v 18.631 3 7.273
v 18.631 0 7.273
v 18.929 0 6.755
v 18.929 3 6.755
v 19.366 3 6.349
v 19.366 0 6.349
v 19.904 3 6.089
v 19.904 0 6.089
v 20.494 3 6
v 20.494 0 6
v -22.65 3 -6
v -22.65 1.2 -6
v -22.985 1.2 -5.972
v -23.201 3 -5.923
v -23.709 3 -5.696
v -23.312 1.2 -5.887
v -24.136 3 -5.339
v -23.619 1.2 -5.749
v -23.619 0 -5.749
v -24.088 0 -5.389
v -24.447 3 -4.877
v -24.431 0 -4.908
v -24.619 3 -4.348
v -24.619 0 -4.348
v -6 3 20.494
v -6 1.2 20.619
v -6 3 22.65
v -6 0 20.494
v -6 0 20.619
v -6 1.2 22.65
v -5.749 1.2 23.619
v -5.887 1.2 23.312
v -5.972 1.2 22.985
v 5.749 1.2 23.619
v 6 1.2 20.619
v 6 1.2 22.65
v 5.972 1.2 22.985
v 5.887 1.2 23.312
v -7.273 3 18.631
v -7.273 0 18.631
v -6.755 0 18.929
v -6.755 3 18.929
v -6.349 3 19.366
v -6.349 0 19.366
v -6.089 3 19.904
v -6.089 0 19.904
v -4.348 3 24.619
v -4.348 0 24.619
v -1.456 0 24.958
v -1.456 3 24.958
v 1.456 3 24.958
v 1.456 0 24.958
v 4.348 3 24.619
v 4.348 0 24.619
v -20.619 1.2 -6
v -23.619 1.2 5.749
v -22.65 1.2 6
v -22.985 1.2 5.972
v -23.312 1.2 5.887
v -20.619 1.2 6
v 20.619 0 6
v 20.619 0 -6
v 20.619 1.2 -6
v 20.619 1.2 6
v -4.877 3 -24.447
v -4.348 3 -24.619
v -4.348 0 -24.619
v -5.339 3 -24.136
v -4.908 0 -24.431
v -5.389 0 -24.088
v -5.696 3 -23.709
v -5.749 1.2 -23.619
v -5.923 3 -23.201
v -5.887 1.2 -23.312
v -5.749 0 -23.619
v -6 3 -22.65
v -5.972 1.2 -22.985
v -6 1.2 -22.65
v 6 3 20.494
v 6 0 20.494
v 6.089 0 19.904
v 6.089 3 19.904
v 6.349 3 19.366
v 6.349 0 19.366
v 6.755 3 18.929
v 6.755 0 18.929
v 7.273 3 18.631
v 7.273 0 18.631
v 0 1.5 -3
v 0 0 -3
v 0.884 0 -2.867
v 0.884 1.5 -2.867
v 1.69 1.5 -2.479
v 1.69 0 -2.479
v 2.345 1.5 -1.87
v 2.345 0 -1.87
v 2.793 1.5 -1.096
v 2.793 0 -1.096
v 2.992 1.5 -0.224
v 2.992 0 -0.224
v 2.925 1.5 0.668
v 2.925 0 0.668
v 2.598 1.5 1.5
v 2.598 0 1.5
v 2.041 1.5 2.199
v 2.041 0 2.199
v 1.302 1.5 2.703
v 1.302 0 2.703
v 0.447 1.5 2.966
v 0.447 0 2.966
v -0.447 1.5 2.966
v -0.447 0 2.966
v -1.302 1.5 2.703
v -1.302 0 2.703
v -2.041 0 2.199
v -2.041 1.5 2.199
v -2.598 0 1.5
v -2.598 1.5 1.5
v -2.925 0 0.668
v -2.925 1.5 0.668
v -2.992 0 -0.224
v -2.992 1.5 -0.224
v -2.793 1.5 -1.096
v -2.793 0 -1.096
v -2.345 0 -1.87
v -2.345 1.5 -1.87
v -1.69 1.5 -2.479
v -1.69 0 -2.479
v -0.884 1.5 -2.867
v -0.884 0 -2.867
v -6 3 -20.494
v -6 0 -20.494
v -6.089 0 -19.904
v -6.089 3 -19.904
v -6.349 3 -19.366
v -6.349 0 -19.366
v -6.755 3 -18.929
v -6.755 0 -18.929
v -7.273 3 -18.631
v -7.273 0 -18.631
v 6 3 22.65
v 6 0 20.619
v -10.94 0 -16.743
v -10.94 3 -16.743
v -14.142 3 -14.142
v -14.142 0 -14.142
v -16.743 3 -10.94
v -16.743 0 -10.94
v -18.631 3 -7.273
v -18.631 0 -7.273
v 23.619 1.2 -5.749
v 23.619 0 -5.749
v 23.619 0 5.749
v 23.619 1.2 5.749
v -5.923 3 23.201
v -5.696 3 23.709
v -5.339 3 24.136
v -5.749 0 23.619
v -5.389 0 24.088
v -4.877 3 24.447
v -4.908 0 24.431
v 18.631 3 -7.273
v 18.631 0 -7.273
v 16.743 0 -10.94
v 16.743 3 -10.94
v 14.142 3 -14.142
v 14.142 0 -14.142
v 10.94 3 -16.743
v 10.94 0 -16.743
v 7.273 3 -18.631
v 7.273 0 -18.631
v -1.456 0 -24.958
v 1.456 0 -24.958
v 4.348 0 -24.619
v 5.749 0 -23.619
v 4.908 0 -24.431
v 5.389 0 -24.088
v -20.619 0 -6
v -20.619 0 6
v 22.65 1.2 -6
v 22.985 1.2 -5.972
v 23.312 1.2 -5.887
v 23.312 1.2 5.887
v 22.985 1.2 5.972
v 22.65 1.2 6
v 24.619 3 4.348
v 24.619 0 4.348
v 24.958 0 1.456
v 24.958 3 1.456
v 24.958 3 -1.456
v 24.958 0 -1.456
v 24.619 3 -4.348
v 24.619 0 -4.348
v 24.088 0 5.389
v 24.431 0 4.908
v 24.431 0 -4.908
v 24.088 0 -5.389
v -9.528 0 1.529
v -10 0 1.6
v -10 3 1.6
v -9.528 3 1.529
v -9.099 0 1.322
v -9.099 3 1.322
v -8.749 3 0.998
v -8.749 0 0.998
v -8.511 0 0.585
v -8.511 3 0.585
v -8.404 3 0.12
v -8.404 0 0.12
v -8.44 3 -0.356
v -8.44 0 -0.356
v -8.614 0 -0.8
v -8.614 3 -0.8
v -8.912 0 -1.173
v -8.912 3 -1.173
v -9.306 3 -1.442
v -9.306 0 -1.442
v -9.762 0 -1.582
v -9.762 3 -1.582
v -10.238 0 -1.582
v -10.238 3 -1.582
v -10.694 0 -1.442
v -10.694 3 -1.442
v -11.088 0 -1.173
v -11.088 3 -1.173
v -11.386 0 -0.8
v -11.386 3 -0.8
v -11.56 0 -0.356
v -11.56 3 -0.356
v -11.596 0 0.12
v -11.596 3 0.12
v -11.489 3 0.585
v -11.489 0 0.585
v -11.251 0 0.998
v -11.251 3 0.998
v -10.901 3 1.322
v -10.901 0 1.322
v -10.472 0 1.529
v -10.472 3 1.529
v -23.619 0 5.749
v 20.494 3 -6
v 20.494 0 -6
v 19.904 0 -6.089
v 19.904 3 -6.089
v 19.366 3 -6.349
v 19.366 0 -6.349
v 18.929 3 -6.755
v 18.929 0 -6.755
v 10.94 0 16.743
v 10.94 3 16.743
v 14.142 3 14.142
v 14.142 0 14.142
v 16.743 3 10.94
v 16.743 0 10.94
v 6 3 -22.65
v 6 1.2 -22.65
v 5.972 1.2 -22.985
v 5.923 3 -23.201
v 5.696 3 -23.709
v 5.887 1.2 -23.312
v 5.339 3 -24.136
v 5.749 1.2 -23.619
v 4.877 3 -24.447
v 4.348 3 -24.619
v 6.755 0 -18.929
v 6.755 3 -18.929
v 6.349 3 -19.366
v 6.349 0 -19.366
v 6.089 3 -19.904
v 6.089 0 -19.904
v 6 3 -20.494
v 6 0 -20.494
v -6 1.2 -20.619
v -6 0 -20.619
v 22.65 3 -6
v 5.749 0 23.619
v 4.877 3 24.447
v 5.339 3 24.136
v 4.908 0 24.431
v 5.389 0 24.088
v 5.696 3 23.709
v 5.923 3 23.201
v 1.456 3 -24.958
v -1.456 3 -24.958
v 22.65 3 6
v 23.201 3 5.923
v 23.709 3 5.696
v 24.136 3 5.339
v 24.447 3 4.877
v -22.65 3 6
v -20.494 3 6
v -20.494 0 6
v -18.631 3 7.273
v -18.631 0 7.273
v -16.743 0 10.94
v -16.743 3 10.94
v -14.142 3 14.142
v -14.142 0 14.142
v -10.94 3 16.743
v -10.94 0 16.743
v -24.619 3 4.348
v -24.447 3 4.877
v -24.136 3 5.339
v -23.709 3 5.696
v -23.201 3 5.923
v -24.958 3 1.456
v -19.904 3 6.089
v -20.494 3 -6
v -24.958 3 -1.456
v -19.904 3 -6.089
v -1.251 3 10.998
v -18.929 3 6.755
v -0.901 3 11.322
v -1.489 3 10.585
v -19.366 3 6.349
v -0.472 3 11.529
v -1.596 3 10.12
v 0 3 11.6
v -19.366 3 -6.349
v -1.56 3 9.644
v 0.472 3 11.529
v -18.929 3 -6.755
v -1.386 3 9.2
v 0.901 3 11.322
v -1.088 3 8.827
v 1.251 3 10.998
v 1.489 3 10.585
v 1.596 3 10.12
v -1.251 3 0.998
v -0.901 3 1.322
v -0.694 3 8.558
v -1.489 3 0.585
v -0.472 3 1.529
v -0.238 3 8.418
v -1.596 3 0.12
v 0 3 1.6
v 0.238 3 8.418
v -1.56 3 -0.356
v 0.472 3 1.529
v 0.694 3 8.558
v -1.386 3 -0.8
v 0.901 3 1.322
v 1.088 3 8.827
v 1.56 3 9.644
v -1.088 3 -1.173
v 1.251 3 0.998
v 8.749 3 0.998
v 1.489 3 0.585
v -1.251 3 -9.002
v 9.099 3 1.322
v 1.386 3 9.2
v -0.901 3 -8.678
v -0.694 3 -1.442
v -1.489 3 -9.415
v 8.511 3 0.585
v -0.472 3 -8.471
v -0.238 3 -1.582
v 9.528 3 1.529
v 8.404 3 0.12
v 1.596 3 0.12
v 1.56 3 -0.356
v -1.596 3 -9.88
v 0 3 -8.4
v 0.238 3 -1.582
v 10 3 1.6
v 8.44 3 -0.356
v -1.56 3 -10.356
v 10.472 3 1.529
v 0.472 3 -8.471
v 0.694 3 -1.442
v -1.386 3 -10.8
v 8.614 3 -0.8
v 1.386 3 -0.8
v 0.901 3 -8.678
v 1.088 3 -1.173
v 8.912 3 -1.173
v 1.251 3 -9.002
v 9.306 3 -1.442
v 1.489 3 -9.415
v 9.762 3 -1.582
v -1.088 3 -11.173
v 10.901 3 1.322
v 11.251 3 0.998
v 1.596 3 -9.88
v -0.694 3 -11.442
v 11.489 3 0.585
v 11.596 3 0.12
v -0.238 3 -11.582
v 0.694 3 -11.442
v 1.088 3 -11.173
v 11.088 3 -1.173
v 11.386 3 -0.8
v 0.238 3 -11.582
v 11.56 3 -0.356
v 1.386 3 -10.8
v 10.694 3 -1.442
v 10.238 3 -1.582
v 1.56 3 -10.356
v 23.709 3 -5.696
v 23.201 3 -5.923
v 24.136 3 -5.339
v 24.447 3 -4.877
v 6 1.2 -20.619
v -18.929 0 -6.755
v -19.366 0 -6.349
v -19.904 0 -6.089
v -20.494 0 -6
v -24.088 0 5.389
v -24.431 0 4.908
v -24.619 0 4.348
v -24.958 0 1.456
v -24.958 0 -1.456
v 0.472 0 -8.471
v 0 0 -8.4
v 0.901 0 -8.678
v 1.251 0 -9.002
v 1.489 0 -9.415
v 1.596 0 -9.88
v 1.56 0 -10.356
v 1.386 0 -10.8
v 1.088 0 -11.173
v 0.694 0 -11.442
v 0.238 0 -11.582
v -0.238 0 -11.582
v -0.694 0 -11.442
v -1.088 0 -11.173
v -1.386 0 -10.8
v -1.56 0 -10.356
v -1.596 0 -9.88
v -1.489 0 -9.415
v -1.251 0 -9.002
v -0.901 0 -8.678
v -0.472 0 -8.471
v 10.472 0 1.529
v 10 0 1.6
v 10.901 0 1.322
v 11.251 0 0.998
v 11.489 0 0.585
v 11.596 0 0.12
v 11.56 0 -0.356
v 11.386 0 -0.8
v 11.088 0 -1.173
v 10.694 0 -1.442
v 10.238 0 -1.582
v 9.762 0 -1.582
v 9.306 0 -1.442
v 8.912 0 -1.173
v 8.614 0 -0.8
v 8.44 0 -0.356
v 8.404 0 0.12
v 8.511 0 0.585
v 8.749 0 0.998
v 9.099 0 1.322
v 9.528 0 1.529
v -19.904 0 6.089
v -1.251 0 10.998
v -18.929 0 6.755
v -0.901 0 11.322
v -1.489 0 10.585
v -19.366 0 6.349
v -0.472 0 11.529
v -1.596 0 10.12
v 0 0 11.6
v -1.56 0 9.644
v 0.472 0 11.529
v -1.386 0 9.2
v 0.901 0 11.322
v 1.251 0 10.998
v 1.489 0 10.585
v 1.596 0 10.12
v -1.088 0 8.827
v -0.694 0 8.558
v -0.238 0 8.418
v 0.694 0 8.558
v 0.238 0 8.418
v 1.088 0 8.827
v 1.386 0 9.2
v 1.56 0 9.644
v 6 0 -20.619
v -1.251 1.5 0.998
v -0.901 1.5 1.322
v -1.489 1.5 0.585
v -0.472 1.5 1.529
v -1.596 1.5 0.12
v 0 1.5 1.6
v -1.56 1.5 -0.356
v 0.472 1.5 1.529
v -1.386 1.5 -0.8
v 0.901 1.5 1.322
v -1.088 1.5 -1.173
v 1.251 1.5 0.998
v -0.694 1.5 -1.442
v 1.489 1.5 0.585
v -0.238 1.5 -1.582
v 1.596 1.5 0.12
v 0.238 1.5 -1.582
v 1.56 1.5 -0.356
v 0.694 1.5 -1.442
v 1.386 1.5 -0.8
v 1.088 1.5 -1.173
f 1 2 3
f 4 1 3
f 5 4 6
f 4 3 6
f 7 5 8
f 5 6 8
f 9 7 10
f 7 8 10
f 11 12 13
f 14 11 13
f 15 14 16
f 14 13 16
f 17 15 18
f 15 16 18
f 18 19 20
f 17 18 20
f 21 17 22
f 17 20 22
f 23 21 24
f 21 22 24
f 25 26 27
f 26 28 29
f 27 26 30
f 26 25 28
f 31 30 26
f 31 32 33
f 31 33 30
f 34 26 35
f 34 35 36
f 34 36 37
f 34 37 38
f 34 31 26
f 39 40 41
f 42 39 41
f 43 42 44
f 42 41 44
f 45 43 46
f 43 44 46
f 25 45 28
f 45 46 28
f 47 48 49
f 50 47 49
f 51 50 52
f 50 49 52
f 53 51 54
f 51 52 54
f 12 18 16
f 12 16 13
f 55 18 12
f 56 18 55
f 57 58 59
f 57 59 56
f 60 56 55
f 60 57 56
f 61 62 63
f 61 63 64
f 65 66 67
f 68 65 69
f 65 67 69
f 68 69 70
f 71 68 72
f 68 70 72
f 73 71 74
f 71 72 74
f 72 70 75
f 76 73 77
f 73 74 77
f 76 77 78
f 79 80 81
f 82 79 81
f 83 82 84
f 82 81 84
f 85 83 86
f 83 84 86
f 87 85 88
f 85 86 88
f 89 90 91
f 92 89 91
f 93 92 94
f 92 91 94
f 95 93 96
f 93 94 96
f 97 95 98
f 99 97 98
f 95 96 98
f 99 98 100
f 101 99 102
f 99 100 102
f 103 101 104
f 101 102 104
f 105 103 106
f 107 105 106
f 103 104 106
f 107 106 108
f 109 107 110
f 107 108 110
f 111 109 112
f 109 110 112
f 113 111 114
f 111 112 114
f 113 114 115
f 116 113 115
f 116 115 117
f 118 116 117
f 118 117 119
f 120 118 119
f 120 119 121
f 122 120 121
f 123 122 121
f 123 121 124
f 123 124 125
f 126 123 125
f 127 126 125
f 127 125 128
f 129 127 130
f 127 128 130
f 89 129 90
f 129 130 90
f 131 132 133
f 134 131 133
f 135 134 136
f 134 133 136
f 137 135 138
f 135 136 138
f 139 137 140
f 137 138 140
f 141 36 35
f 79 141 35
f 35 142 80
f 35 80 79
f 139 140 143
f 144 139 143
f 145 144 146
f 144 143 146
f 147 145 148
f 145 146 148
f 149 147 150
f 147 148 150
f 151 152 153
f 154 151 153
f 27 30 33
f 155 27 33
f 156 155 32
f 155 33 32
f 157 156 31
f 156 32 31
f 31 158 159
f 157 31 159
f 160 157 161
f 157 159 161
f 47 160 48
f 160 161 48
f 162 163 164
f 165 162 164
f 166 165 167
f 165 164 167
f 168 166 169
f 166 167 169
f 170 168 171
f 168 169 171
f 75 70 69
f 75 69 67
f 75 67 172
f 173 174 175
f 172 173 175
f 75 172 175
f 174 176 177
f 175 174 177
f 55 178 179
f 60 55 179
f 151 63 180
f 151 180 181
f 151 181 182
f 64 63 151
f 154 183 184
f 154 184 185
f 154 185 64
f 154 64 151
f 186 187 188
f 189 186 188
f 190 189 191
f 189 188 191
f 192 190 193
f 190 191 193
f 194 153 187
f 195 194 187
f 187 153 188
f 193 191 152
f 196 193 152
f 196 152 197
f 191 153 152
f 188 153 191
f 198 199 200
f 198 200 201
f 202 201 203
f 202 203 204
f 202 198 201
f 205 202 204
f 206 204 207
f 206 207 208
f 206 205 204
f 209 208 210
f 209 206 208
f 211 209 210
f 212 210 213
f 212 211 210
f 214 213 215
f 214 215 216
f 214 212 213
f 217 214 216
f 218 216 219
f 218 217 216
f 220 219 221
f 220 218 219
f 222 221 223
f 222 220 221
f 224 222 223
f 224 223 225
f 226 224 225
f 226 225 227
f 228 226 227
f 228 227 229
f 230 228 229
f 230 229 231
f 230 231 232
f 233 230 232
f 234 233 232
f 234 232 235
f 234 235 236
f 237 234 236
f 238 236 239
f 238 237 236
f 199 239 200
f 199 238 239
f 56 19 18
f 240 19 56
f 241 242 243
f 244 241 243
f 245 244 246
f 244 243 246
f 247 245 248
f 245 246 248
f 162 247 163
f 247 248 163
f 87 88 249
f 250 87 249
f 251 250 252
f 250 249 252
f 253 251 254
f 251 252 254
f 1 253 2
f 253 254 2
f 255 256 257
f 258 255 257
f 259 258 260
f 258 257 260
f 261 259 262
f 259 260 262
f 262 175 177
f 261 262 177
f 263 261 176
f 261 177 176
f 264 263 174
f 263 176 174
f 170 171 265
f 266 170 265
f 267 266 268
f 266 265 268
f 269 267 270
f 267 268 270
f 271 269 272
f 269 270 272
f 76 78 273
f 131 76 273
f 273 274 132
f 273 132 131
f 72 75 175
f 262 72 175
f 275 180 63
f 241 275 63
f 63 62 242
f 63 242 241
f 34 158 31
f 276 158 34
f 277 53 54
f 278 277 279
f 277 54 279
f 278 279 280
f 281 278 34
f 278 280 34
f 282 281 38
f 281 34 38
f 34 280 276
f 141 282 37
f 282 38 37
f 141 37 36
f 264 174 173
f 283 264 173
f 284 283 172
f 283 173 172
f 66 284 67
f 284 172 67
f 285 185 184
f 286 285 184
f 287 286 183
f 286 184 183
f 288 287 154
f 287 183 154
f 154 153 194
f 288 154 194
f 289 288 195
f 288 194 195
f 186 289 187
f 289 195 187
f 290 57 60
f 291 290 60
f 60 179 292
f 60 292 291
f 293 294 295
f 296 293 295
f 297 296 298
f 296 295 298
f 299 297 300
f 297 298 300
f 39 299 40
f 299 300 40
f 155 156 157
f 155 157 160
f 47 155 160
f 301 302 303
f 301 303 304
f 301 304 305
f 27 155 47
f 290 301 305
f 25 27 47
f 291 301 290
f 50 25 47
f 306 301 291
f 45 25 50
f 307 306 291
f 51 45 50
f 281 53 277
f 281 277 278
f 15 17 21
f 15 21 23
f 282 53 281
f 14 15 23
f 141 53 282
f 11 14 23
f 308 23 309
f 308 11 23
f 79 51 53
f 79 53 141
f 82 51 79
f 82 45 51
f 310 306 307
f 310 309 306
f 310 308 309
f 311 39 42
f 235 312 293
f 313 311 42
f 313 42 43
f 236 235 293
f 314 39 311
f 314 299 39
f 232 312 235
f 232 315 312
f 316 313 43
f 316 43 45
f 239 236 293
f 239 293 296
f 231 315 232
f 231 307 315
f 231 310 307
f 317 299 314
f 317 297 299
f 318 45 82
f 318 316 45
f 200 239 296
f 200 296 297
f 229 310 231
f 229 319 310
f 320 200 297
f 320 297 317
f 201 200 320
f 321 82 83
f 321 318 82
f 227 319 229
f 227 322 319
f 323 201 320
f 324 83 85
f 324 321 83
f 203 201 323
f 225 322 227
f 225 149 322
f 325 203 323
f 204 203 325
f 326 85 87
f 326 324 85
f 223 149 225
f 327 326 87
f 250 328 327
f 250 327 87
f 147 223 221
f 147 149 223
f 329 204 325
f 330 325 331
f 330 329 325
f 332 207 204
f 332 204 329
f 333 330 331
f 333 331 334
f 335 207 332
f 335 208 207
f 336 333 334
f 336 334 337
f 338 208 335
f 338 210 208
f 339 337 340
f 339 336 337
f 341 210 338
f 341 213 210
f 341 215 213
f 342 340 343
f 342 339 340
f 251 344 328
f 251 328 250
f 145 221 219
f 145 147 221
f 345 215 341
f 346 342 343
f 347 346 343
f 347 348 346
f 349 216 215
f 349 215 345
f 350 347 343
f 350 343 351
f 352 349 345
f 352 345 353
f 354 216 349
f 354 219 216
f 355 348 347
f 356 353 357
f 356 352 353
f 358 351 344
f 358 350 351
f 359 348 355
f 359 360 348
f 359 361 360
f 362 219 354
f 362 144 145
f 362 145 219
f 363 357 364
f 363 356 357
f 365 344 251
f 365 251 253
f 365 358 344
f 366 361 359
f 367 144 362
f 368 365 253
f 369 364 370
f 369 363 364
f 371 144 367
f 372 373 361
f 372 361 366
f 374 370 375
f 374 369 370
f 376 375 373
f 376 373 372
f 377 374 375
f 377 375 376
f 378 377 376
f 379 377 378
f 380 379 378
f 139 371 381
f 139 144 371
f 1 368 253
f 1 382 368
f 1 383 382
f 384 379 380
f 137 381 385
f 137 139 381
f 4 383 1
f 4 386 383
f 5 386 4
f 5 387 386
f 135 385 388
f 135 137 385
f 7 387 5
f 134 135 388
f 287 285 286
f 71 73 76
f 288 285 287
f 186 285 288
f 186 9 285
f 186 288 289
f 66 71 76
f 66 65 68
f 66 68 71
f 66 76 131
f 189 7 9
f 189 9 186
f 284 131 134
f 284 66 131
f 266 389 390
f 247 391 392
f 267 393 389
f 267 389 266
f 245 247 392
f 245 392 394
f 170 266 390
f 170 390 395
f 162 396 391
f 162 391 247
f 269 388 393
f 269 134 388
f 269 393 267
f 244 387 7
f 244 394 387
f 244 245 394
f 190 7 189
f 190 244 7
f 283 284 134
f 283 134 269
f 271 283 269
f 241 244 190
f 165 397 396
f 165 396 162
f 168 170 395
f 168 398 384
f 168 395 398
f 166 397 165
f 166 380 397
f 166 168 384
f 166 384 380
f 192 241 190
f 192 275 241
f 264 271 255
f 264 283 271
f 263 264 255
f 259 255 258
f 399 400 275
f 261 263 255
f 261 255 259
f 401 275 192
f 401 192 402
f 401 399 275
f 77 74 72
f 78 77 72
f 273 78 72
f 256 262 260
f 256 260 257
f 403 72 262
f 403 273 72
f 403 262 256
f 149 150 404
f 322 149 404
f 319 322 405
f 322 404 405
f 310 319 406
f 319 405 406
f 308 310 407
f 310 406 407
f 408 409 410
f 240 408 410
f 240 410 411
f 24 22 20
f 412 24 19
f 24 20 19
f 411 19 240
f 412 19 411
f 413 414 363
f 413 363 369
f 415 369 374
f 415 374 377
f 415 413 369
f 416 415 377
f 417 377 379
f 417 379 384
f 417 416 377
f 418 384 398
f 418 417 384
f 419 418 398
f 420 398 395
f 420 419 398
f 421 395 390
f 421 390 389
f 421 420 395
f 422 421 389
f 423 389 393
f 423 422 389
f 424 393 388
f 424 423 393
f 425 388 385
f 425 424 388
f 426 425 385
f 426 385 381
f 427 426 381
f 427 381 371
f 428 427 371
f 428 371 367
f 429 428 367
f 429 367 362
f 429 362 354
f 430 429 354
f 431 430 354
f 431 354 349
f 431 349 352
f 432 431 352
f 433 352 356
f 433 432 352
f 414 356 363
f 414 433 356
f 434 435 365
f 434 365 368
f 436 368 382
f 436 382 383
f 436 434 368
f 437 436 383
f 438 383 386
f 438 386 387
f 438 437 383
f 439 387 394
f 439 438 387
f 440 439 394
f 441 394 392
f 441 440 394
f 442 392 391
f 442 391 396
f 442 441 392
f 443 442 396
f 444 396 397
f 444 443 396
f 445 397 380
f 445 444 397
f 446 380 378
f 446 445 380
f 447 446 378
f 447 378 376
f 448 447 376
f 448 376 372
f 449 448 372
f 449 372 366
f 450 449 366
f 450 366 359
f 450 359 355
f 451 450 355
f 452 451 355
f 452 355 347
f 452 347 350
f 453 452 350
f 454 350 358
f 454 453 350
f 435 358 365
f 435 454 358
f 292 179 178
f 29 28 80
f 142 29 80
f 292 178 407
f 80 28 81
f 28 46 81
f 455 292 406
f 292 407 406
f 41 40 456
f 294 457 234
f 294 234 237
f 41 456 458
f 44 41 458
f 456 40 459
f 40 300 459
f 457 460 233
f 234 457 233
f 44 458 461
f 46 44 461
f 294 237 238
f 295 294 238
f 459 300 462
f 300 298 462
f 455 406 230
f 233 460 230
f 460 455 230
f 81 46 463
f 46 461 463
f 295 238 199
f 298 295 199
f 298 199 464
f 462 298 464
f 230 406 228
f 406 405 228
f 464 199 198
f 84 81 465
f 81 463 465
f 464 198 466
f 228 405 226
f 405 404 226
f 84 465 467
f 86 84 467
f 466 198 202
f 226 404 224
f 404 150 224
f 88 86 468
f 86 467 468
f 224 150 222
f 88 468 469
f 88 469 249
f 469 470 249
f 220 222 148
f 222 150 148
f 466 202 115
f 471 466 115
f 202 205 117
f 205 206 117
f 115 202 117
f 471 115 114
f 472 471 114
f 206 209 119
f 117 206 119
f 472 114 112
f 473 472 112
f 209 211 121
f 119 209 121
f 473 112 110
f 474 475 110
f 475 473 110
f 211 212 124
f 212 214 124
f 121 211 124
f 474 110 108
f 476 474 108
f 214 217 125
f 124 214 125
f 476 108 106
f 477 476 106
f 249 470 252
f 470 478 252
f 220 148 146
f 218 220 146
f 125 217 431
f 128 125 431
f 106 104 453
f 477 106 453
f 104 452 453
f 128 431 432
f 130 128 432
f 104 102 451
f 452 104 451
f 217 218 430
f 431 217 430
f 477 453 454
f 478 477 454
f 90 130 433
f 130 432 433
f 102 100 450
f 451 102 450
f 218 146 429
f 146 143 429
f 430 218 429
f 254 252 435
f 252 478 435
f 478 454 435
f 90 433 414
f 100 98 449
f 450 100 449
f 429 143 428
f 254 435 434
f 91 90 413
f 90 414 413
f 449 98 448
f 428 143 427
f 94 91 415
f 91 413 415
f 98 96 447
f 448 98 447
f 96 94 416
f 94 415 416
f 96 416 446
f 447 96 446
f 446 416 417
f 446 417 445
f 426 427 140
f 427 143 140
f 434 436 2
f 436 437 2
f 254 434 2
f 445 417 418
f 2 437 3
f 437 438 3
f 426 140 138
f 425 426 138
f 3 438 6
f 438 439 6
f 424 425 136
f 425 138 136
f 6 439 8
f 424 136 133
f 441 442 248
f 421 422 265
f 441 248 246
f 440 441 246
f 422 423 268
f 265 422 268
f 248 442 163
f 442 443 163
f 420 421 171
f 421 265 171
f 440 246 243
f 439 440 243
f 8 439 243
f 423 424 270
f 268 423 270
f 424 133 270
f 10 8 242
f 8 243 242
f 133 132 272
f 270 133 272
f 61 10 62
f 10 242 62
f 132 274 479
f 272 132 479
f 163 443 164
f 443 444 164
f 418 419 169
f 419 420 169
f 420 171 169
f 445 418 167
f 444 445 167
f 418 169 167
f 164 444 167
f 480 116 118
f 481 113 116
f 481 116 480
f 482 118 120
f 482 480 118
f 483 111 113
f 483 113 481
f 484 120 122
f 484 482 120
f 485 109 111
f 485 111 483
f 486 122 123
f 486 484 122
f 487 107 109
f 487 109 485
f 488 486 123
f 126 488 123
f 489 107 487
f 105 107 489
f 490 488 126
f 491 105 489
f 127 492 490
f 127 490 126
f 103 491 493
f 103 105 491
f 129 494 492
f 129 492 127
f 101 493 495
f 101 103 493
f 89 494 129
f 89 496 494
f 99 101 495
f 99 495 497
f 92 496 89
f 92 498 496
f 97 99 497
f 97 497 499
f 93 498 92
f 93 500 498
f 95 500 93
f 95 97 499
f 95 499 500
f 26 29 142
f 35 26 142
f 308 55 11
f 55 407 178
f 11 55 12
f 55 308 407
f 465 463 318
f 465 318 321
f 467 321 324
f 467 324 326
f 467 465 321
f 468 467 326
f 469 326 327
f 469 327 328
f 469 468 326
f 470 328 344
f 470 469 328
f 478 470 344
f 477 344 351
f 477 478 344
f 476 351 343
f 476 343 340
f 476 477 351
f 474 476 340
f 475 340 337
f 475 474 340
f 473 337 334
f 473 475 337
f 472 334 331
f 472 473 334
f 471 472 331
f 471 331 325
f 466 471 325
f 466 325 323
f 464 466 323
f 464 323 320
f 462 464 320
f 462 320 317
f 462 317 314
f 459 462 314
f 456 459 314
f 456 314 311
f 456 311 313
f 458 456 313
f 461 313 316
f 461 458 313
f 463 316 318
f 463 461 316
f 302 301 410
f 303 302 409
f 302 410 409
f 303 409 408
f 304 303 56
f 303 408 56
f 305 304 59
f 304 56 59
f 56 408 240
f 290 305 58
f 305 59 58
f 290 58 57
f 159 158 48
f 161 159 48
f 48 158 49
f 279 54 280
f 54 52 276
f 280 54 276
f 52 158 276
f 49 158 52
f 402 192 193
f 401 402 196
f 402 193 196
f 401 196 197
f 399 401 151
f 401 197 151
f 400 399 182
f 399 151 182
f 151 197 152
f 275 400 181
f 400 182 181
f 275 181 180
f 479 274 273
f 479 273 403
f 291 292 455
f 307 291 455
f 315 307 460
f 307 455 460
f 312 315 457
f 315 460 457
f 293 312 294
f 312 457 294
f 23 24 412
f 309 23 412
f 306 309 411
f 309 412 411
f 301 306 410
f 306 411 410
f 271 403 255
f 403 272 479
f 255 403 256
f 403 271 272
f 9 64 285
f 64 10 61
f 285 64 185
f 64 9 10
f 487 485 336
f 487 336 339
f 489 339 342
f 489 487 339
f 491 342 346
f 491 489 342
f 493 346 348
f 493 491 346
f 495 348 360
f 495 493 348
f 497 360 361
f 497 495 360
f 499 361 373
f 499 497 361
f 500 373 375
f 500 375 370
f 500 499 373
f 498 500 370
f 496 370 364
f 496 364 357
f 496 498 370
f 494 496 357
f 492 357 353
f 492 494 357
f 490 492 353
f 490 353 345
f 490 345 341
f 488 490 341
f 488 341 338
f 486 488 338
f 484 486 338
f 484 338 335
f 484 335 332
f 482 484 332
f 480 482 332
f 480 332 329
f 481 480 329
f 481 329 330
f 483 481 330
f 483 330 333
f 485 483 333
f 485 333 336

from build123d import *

# Parameters (mm, degrees)
SKIZZE1_R                       = 19
SKIZZE1_R_2                     = 1.6
AUFSATZ_LINEAR_AUSTRAGEN1_DEPTH = 3
SKIZZE6_R                       = 3
SCHNITT_LINEAR_AUSTRAGEN2_DEPTH = 1.5
SKIZZE7_W                       = 3
SKIZZE7_H                       = 12
SKIZZE7_W_2                     = 12
SKIZZE7_H_2                     = 3
SCHNITT_LINEAR_AUSTRAGEN3_DEPTH = 1.2


with BuildPart() as part:
    # Skizze1 → Aufsatz-Linear austragen1 (new body)
    with BuildSketch(Plane(origin=(0, 0, 0), x_dir=(1, 0, 0), z_dir=(0, 1, 0))):
        with BuildLine():
            ThreePointArc((6, -20.493901532), (6.348554352, -19.365749382), (7.272727273, -18.630819574))
            ThreePointArc((7.272727273, -18.630819574), (14.142135624, -14.142135624), (18.630819574, -7.272727273))
            ThreePointArc((18.630819574, -7.272727273), (19.365749382, -6.348554352), (20.493901532, -6))
            Line((20.493901532, -6), (22.649503306, -6))
            ThreePointArc((22.649503306, -6), (23.93487248, -5.532261755), (24.619025332, -4.347826087))
            ThreePointArc((24.619025332, -4.347826087), (25, 0), (24.619025332, 4.347826087))
            ThreePointArc((24.619025332, 4.347826087), (23.93487248, 5.532261755), (22.649503306, 6))
            Line((22.649503306, 6), (20.493901532, 6))
            ThreePointArc((20.493901532, 6), (19.365749382, 6.348554352), (18.630819574, 7.272727273))
            ThreePointArc((18.630819574, 7.272727273), (14.142135624, 14.142135624), (7.272727273, 18.630819574))
            ThreePointArc((7.272727273, 18.630819574), (6.348554352, 19.365749382), (6, 20.493901532))
            Line((6, 20.493901532), (6, 22.649503306))
            ThreePointArc((6, 22.649503306), (5.532261755, 23.93487248), (4.347826087, 24.619025332))
            ThreePointArc((4.347826087, 24.619025332), (0, 25), (-4.347826087, 24.619025332))
            ThreePointArc((-4.347826087, 24.619025332), (-5.532261755, 23.93487248), (-6, 22.649503306))
            Line((-6, 22.649503306), (-6, 20.493901532))
            ThreePointArc((-6, 20.493901532), (-6.348554352, 19.365749382), (-7.272727273, 18.630819574))
            ThreePointArc((-7.272727273, 18.630819574), (-14.142135624, 14.142135624), (-18.630819574, 7.272727273))
            ThreePointArc((-18.630819574, 7.272727273), (-19.365749382, 6.348554352), (-20.493901532, 6))
            Line((-20.493901532, 6), (-22.649503306, 6))
            ThreePointArc((-22.649503306, 6), (-23.93487248, 5.532261755), (-24.619025332, 4.347826087))
            ThreePointArc((-24.619025332, 4.347826087), (-25, 0), (-24.619025332, -4.347826087))
            ThreePointArc((-24.619025332, -4.347826087), (-23.93487248, -5.532261755), (-22.649503306, -6))
            Line((-22.649503306, -6), (-20.493901532, -6))
            ThreePointArc((-20.493901532, -6), (-19.365749382, -6.348554352), (-18.630819574, -7.272727273))
            ThreePointArc((-18.630819574, -7.272727273), (-14.142135624, -14.142135624), (-7.272727273, -18.630819574))
            ThreePointArc((-7.272727273, -18.630819574), (-6.348554352, -19.365749382), (-6, -20.493901532))
            Line((-6, -20.493901532), (-6, -22.649503306))
            ThreePointArc((-6, -22.649503306), (-5.532261755, -23.93487248), (-4.347826087, -24.619025332))
            ThreePointArc((-4.347826087, -24.619025332), (0, -25), (4.347826087, -24.619025332))
            ThreePointArc((4.347826087, -24.619025332), (5.532261755, -23.93487248), (6, -22.649503306))
            Line((6, -22.649503306), (6, -20.493901532))
        make_face()
        Circle(SKIZZE1_R, mode=Mode.SUBTRACT)
        Circle(SKIZZE1_R)
        with Locations(Location((0, -10, 0), (0, 0, 270))):
            Circle(SKIZZE1_R_2, mode=Mode.SUBTRACT)
        with Locations(Location((-10, 0, 0), (0, 0, 270))):
            Circle(SKIZZE1_R_2, mode=Mode.SUBTRACT)
        with Locations(Location((10, 0, 0), (0, 0, 270))):
            Circle(SKIZZE1_R_2, mode=Mode.SUBTRACT)
        with Locations(Location((0, 10, 0), (0, 0, 270))):
            Circle(SKIZZE1_R_2, mode=Mode.SUBTRACT)
        with Locations(Location((0, 0, 0), (0, 0, 270))):
            Circle(SKIZZE1_R_2, mode=Mode.SUBTRACT)
    extrude(amount=AUFSATZ_LINEAR_AUSTRAGEN1_DEPTH)

    # Skizze6 → Schnitt-Linear austragen2 (cut)
    with BuildSketch(Plane.XZ):
        with Locations(Location((0, 0, 0), (0, 0, 270))):
            Circle(SKIZZE6_R)
    extrude(amount=-SCHNITT_LINEAR_AUSTRAGEN2_DEPTH, mode=Mode.SUBTRACT)

    # Skizze7 → Schnitt-Linear austragen3 (cut)
    with BuildSketch(Plane.XZ):
        with Locations((-22.119025332, 0)):
            Rectangle(SKIZZE7_W, SKIZZE7_H)
        with Locations((0, 22.119025332)):
            Rectangle(SKIZZE7_W_2, SKIZZE7_H_2)
        with Locations((22.119025332, 0)):
            Rectangle(SKIZZE7_W, SKIZZE7_H)
        with Locations((0, -22.119025332)):
            Rectangle(SKIZZE7_W_2, SKIZZE7_H_2)
    extrude(amount=-SCHNITT_LINEAR_AUSTRAGEN3_DEPTH, mode=Mode.SUBTRACT)


solid = part.part
